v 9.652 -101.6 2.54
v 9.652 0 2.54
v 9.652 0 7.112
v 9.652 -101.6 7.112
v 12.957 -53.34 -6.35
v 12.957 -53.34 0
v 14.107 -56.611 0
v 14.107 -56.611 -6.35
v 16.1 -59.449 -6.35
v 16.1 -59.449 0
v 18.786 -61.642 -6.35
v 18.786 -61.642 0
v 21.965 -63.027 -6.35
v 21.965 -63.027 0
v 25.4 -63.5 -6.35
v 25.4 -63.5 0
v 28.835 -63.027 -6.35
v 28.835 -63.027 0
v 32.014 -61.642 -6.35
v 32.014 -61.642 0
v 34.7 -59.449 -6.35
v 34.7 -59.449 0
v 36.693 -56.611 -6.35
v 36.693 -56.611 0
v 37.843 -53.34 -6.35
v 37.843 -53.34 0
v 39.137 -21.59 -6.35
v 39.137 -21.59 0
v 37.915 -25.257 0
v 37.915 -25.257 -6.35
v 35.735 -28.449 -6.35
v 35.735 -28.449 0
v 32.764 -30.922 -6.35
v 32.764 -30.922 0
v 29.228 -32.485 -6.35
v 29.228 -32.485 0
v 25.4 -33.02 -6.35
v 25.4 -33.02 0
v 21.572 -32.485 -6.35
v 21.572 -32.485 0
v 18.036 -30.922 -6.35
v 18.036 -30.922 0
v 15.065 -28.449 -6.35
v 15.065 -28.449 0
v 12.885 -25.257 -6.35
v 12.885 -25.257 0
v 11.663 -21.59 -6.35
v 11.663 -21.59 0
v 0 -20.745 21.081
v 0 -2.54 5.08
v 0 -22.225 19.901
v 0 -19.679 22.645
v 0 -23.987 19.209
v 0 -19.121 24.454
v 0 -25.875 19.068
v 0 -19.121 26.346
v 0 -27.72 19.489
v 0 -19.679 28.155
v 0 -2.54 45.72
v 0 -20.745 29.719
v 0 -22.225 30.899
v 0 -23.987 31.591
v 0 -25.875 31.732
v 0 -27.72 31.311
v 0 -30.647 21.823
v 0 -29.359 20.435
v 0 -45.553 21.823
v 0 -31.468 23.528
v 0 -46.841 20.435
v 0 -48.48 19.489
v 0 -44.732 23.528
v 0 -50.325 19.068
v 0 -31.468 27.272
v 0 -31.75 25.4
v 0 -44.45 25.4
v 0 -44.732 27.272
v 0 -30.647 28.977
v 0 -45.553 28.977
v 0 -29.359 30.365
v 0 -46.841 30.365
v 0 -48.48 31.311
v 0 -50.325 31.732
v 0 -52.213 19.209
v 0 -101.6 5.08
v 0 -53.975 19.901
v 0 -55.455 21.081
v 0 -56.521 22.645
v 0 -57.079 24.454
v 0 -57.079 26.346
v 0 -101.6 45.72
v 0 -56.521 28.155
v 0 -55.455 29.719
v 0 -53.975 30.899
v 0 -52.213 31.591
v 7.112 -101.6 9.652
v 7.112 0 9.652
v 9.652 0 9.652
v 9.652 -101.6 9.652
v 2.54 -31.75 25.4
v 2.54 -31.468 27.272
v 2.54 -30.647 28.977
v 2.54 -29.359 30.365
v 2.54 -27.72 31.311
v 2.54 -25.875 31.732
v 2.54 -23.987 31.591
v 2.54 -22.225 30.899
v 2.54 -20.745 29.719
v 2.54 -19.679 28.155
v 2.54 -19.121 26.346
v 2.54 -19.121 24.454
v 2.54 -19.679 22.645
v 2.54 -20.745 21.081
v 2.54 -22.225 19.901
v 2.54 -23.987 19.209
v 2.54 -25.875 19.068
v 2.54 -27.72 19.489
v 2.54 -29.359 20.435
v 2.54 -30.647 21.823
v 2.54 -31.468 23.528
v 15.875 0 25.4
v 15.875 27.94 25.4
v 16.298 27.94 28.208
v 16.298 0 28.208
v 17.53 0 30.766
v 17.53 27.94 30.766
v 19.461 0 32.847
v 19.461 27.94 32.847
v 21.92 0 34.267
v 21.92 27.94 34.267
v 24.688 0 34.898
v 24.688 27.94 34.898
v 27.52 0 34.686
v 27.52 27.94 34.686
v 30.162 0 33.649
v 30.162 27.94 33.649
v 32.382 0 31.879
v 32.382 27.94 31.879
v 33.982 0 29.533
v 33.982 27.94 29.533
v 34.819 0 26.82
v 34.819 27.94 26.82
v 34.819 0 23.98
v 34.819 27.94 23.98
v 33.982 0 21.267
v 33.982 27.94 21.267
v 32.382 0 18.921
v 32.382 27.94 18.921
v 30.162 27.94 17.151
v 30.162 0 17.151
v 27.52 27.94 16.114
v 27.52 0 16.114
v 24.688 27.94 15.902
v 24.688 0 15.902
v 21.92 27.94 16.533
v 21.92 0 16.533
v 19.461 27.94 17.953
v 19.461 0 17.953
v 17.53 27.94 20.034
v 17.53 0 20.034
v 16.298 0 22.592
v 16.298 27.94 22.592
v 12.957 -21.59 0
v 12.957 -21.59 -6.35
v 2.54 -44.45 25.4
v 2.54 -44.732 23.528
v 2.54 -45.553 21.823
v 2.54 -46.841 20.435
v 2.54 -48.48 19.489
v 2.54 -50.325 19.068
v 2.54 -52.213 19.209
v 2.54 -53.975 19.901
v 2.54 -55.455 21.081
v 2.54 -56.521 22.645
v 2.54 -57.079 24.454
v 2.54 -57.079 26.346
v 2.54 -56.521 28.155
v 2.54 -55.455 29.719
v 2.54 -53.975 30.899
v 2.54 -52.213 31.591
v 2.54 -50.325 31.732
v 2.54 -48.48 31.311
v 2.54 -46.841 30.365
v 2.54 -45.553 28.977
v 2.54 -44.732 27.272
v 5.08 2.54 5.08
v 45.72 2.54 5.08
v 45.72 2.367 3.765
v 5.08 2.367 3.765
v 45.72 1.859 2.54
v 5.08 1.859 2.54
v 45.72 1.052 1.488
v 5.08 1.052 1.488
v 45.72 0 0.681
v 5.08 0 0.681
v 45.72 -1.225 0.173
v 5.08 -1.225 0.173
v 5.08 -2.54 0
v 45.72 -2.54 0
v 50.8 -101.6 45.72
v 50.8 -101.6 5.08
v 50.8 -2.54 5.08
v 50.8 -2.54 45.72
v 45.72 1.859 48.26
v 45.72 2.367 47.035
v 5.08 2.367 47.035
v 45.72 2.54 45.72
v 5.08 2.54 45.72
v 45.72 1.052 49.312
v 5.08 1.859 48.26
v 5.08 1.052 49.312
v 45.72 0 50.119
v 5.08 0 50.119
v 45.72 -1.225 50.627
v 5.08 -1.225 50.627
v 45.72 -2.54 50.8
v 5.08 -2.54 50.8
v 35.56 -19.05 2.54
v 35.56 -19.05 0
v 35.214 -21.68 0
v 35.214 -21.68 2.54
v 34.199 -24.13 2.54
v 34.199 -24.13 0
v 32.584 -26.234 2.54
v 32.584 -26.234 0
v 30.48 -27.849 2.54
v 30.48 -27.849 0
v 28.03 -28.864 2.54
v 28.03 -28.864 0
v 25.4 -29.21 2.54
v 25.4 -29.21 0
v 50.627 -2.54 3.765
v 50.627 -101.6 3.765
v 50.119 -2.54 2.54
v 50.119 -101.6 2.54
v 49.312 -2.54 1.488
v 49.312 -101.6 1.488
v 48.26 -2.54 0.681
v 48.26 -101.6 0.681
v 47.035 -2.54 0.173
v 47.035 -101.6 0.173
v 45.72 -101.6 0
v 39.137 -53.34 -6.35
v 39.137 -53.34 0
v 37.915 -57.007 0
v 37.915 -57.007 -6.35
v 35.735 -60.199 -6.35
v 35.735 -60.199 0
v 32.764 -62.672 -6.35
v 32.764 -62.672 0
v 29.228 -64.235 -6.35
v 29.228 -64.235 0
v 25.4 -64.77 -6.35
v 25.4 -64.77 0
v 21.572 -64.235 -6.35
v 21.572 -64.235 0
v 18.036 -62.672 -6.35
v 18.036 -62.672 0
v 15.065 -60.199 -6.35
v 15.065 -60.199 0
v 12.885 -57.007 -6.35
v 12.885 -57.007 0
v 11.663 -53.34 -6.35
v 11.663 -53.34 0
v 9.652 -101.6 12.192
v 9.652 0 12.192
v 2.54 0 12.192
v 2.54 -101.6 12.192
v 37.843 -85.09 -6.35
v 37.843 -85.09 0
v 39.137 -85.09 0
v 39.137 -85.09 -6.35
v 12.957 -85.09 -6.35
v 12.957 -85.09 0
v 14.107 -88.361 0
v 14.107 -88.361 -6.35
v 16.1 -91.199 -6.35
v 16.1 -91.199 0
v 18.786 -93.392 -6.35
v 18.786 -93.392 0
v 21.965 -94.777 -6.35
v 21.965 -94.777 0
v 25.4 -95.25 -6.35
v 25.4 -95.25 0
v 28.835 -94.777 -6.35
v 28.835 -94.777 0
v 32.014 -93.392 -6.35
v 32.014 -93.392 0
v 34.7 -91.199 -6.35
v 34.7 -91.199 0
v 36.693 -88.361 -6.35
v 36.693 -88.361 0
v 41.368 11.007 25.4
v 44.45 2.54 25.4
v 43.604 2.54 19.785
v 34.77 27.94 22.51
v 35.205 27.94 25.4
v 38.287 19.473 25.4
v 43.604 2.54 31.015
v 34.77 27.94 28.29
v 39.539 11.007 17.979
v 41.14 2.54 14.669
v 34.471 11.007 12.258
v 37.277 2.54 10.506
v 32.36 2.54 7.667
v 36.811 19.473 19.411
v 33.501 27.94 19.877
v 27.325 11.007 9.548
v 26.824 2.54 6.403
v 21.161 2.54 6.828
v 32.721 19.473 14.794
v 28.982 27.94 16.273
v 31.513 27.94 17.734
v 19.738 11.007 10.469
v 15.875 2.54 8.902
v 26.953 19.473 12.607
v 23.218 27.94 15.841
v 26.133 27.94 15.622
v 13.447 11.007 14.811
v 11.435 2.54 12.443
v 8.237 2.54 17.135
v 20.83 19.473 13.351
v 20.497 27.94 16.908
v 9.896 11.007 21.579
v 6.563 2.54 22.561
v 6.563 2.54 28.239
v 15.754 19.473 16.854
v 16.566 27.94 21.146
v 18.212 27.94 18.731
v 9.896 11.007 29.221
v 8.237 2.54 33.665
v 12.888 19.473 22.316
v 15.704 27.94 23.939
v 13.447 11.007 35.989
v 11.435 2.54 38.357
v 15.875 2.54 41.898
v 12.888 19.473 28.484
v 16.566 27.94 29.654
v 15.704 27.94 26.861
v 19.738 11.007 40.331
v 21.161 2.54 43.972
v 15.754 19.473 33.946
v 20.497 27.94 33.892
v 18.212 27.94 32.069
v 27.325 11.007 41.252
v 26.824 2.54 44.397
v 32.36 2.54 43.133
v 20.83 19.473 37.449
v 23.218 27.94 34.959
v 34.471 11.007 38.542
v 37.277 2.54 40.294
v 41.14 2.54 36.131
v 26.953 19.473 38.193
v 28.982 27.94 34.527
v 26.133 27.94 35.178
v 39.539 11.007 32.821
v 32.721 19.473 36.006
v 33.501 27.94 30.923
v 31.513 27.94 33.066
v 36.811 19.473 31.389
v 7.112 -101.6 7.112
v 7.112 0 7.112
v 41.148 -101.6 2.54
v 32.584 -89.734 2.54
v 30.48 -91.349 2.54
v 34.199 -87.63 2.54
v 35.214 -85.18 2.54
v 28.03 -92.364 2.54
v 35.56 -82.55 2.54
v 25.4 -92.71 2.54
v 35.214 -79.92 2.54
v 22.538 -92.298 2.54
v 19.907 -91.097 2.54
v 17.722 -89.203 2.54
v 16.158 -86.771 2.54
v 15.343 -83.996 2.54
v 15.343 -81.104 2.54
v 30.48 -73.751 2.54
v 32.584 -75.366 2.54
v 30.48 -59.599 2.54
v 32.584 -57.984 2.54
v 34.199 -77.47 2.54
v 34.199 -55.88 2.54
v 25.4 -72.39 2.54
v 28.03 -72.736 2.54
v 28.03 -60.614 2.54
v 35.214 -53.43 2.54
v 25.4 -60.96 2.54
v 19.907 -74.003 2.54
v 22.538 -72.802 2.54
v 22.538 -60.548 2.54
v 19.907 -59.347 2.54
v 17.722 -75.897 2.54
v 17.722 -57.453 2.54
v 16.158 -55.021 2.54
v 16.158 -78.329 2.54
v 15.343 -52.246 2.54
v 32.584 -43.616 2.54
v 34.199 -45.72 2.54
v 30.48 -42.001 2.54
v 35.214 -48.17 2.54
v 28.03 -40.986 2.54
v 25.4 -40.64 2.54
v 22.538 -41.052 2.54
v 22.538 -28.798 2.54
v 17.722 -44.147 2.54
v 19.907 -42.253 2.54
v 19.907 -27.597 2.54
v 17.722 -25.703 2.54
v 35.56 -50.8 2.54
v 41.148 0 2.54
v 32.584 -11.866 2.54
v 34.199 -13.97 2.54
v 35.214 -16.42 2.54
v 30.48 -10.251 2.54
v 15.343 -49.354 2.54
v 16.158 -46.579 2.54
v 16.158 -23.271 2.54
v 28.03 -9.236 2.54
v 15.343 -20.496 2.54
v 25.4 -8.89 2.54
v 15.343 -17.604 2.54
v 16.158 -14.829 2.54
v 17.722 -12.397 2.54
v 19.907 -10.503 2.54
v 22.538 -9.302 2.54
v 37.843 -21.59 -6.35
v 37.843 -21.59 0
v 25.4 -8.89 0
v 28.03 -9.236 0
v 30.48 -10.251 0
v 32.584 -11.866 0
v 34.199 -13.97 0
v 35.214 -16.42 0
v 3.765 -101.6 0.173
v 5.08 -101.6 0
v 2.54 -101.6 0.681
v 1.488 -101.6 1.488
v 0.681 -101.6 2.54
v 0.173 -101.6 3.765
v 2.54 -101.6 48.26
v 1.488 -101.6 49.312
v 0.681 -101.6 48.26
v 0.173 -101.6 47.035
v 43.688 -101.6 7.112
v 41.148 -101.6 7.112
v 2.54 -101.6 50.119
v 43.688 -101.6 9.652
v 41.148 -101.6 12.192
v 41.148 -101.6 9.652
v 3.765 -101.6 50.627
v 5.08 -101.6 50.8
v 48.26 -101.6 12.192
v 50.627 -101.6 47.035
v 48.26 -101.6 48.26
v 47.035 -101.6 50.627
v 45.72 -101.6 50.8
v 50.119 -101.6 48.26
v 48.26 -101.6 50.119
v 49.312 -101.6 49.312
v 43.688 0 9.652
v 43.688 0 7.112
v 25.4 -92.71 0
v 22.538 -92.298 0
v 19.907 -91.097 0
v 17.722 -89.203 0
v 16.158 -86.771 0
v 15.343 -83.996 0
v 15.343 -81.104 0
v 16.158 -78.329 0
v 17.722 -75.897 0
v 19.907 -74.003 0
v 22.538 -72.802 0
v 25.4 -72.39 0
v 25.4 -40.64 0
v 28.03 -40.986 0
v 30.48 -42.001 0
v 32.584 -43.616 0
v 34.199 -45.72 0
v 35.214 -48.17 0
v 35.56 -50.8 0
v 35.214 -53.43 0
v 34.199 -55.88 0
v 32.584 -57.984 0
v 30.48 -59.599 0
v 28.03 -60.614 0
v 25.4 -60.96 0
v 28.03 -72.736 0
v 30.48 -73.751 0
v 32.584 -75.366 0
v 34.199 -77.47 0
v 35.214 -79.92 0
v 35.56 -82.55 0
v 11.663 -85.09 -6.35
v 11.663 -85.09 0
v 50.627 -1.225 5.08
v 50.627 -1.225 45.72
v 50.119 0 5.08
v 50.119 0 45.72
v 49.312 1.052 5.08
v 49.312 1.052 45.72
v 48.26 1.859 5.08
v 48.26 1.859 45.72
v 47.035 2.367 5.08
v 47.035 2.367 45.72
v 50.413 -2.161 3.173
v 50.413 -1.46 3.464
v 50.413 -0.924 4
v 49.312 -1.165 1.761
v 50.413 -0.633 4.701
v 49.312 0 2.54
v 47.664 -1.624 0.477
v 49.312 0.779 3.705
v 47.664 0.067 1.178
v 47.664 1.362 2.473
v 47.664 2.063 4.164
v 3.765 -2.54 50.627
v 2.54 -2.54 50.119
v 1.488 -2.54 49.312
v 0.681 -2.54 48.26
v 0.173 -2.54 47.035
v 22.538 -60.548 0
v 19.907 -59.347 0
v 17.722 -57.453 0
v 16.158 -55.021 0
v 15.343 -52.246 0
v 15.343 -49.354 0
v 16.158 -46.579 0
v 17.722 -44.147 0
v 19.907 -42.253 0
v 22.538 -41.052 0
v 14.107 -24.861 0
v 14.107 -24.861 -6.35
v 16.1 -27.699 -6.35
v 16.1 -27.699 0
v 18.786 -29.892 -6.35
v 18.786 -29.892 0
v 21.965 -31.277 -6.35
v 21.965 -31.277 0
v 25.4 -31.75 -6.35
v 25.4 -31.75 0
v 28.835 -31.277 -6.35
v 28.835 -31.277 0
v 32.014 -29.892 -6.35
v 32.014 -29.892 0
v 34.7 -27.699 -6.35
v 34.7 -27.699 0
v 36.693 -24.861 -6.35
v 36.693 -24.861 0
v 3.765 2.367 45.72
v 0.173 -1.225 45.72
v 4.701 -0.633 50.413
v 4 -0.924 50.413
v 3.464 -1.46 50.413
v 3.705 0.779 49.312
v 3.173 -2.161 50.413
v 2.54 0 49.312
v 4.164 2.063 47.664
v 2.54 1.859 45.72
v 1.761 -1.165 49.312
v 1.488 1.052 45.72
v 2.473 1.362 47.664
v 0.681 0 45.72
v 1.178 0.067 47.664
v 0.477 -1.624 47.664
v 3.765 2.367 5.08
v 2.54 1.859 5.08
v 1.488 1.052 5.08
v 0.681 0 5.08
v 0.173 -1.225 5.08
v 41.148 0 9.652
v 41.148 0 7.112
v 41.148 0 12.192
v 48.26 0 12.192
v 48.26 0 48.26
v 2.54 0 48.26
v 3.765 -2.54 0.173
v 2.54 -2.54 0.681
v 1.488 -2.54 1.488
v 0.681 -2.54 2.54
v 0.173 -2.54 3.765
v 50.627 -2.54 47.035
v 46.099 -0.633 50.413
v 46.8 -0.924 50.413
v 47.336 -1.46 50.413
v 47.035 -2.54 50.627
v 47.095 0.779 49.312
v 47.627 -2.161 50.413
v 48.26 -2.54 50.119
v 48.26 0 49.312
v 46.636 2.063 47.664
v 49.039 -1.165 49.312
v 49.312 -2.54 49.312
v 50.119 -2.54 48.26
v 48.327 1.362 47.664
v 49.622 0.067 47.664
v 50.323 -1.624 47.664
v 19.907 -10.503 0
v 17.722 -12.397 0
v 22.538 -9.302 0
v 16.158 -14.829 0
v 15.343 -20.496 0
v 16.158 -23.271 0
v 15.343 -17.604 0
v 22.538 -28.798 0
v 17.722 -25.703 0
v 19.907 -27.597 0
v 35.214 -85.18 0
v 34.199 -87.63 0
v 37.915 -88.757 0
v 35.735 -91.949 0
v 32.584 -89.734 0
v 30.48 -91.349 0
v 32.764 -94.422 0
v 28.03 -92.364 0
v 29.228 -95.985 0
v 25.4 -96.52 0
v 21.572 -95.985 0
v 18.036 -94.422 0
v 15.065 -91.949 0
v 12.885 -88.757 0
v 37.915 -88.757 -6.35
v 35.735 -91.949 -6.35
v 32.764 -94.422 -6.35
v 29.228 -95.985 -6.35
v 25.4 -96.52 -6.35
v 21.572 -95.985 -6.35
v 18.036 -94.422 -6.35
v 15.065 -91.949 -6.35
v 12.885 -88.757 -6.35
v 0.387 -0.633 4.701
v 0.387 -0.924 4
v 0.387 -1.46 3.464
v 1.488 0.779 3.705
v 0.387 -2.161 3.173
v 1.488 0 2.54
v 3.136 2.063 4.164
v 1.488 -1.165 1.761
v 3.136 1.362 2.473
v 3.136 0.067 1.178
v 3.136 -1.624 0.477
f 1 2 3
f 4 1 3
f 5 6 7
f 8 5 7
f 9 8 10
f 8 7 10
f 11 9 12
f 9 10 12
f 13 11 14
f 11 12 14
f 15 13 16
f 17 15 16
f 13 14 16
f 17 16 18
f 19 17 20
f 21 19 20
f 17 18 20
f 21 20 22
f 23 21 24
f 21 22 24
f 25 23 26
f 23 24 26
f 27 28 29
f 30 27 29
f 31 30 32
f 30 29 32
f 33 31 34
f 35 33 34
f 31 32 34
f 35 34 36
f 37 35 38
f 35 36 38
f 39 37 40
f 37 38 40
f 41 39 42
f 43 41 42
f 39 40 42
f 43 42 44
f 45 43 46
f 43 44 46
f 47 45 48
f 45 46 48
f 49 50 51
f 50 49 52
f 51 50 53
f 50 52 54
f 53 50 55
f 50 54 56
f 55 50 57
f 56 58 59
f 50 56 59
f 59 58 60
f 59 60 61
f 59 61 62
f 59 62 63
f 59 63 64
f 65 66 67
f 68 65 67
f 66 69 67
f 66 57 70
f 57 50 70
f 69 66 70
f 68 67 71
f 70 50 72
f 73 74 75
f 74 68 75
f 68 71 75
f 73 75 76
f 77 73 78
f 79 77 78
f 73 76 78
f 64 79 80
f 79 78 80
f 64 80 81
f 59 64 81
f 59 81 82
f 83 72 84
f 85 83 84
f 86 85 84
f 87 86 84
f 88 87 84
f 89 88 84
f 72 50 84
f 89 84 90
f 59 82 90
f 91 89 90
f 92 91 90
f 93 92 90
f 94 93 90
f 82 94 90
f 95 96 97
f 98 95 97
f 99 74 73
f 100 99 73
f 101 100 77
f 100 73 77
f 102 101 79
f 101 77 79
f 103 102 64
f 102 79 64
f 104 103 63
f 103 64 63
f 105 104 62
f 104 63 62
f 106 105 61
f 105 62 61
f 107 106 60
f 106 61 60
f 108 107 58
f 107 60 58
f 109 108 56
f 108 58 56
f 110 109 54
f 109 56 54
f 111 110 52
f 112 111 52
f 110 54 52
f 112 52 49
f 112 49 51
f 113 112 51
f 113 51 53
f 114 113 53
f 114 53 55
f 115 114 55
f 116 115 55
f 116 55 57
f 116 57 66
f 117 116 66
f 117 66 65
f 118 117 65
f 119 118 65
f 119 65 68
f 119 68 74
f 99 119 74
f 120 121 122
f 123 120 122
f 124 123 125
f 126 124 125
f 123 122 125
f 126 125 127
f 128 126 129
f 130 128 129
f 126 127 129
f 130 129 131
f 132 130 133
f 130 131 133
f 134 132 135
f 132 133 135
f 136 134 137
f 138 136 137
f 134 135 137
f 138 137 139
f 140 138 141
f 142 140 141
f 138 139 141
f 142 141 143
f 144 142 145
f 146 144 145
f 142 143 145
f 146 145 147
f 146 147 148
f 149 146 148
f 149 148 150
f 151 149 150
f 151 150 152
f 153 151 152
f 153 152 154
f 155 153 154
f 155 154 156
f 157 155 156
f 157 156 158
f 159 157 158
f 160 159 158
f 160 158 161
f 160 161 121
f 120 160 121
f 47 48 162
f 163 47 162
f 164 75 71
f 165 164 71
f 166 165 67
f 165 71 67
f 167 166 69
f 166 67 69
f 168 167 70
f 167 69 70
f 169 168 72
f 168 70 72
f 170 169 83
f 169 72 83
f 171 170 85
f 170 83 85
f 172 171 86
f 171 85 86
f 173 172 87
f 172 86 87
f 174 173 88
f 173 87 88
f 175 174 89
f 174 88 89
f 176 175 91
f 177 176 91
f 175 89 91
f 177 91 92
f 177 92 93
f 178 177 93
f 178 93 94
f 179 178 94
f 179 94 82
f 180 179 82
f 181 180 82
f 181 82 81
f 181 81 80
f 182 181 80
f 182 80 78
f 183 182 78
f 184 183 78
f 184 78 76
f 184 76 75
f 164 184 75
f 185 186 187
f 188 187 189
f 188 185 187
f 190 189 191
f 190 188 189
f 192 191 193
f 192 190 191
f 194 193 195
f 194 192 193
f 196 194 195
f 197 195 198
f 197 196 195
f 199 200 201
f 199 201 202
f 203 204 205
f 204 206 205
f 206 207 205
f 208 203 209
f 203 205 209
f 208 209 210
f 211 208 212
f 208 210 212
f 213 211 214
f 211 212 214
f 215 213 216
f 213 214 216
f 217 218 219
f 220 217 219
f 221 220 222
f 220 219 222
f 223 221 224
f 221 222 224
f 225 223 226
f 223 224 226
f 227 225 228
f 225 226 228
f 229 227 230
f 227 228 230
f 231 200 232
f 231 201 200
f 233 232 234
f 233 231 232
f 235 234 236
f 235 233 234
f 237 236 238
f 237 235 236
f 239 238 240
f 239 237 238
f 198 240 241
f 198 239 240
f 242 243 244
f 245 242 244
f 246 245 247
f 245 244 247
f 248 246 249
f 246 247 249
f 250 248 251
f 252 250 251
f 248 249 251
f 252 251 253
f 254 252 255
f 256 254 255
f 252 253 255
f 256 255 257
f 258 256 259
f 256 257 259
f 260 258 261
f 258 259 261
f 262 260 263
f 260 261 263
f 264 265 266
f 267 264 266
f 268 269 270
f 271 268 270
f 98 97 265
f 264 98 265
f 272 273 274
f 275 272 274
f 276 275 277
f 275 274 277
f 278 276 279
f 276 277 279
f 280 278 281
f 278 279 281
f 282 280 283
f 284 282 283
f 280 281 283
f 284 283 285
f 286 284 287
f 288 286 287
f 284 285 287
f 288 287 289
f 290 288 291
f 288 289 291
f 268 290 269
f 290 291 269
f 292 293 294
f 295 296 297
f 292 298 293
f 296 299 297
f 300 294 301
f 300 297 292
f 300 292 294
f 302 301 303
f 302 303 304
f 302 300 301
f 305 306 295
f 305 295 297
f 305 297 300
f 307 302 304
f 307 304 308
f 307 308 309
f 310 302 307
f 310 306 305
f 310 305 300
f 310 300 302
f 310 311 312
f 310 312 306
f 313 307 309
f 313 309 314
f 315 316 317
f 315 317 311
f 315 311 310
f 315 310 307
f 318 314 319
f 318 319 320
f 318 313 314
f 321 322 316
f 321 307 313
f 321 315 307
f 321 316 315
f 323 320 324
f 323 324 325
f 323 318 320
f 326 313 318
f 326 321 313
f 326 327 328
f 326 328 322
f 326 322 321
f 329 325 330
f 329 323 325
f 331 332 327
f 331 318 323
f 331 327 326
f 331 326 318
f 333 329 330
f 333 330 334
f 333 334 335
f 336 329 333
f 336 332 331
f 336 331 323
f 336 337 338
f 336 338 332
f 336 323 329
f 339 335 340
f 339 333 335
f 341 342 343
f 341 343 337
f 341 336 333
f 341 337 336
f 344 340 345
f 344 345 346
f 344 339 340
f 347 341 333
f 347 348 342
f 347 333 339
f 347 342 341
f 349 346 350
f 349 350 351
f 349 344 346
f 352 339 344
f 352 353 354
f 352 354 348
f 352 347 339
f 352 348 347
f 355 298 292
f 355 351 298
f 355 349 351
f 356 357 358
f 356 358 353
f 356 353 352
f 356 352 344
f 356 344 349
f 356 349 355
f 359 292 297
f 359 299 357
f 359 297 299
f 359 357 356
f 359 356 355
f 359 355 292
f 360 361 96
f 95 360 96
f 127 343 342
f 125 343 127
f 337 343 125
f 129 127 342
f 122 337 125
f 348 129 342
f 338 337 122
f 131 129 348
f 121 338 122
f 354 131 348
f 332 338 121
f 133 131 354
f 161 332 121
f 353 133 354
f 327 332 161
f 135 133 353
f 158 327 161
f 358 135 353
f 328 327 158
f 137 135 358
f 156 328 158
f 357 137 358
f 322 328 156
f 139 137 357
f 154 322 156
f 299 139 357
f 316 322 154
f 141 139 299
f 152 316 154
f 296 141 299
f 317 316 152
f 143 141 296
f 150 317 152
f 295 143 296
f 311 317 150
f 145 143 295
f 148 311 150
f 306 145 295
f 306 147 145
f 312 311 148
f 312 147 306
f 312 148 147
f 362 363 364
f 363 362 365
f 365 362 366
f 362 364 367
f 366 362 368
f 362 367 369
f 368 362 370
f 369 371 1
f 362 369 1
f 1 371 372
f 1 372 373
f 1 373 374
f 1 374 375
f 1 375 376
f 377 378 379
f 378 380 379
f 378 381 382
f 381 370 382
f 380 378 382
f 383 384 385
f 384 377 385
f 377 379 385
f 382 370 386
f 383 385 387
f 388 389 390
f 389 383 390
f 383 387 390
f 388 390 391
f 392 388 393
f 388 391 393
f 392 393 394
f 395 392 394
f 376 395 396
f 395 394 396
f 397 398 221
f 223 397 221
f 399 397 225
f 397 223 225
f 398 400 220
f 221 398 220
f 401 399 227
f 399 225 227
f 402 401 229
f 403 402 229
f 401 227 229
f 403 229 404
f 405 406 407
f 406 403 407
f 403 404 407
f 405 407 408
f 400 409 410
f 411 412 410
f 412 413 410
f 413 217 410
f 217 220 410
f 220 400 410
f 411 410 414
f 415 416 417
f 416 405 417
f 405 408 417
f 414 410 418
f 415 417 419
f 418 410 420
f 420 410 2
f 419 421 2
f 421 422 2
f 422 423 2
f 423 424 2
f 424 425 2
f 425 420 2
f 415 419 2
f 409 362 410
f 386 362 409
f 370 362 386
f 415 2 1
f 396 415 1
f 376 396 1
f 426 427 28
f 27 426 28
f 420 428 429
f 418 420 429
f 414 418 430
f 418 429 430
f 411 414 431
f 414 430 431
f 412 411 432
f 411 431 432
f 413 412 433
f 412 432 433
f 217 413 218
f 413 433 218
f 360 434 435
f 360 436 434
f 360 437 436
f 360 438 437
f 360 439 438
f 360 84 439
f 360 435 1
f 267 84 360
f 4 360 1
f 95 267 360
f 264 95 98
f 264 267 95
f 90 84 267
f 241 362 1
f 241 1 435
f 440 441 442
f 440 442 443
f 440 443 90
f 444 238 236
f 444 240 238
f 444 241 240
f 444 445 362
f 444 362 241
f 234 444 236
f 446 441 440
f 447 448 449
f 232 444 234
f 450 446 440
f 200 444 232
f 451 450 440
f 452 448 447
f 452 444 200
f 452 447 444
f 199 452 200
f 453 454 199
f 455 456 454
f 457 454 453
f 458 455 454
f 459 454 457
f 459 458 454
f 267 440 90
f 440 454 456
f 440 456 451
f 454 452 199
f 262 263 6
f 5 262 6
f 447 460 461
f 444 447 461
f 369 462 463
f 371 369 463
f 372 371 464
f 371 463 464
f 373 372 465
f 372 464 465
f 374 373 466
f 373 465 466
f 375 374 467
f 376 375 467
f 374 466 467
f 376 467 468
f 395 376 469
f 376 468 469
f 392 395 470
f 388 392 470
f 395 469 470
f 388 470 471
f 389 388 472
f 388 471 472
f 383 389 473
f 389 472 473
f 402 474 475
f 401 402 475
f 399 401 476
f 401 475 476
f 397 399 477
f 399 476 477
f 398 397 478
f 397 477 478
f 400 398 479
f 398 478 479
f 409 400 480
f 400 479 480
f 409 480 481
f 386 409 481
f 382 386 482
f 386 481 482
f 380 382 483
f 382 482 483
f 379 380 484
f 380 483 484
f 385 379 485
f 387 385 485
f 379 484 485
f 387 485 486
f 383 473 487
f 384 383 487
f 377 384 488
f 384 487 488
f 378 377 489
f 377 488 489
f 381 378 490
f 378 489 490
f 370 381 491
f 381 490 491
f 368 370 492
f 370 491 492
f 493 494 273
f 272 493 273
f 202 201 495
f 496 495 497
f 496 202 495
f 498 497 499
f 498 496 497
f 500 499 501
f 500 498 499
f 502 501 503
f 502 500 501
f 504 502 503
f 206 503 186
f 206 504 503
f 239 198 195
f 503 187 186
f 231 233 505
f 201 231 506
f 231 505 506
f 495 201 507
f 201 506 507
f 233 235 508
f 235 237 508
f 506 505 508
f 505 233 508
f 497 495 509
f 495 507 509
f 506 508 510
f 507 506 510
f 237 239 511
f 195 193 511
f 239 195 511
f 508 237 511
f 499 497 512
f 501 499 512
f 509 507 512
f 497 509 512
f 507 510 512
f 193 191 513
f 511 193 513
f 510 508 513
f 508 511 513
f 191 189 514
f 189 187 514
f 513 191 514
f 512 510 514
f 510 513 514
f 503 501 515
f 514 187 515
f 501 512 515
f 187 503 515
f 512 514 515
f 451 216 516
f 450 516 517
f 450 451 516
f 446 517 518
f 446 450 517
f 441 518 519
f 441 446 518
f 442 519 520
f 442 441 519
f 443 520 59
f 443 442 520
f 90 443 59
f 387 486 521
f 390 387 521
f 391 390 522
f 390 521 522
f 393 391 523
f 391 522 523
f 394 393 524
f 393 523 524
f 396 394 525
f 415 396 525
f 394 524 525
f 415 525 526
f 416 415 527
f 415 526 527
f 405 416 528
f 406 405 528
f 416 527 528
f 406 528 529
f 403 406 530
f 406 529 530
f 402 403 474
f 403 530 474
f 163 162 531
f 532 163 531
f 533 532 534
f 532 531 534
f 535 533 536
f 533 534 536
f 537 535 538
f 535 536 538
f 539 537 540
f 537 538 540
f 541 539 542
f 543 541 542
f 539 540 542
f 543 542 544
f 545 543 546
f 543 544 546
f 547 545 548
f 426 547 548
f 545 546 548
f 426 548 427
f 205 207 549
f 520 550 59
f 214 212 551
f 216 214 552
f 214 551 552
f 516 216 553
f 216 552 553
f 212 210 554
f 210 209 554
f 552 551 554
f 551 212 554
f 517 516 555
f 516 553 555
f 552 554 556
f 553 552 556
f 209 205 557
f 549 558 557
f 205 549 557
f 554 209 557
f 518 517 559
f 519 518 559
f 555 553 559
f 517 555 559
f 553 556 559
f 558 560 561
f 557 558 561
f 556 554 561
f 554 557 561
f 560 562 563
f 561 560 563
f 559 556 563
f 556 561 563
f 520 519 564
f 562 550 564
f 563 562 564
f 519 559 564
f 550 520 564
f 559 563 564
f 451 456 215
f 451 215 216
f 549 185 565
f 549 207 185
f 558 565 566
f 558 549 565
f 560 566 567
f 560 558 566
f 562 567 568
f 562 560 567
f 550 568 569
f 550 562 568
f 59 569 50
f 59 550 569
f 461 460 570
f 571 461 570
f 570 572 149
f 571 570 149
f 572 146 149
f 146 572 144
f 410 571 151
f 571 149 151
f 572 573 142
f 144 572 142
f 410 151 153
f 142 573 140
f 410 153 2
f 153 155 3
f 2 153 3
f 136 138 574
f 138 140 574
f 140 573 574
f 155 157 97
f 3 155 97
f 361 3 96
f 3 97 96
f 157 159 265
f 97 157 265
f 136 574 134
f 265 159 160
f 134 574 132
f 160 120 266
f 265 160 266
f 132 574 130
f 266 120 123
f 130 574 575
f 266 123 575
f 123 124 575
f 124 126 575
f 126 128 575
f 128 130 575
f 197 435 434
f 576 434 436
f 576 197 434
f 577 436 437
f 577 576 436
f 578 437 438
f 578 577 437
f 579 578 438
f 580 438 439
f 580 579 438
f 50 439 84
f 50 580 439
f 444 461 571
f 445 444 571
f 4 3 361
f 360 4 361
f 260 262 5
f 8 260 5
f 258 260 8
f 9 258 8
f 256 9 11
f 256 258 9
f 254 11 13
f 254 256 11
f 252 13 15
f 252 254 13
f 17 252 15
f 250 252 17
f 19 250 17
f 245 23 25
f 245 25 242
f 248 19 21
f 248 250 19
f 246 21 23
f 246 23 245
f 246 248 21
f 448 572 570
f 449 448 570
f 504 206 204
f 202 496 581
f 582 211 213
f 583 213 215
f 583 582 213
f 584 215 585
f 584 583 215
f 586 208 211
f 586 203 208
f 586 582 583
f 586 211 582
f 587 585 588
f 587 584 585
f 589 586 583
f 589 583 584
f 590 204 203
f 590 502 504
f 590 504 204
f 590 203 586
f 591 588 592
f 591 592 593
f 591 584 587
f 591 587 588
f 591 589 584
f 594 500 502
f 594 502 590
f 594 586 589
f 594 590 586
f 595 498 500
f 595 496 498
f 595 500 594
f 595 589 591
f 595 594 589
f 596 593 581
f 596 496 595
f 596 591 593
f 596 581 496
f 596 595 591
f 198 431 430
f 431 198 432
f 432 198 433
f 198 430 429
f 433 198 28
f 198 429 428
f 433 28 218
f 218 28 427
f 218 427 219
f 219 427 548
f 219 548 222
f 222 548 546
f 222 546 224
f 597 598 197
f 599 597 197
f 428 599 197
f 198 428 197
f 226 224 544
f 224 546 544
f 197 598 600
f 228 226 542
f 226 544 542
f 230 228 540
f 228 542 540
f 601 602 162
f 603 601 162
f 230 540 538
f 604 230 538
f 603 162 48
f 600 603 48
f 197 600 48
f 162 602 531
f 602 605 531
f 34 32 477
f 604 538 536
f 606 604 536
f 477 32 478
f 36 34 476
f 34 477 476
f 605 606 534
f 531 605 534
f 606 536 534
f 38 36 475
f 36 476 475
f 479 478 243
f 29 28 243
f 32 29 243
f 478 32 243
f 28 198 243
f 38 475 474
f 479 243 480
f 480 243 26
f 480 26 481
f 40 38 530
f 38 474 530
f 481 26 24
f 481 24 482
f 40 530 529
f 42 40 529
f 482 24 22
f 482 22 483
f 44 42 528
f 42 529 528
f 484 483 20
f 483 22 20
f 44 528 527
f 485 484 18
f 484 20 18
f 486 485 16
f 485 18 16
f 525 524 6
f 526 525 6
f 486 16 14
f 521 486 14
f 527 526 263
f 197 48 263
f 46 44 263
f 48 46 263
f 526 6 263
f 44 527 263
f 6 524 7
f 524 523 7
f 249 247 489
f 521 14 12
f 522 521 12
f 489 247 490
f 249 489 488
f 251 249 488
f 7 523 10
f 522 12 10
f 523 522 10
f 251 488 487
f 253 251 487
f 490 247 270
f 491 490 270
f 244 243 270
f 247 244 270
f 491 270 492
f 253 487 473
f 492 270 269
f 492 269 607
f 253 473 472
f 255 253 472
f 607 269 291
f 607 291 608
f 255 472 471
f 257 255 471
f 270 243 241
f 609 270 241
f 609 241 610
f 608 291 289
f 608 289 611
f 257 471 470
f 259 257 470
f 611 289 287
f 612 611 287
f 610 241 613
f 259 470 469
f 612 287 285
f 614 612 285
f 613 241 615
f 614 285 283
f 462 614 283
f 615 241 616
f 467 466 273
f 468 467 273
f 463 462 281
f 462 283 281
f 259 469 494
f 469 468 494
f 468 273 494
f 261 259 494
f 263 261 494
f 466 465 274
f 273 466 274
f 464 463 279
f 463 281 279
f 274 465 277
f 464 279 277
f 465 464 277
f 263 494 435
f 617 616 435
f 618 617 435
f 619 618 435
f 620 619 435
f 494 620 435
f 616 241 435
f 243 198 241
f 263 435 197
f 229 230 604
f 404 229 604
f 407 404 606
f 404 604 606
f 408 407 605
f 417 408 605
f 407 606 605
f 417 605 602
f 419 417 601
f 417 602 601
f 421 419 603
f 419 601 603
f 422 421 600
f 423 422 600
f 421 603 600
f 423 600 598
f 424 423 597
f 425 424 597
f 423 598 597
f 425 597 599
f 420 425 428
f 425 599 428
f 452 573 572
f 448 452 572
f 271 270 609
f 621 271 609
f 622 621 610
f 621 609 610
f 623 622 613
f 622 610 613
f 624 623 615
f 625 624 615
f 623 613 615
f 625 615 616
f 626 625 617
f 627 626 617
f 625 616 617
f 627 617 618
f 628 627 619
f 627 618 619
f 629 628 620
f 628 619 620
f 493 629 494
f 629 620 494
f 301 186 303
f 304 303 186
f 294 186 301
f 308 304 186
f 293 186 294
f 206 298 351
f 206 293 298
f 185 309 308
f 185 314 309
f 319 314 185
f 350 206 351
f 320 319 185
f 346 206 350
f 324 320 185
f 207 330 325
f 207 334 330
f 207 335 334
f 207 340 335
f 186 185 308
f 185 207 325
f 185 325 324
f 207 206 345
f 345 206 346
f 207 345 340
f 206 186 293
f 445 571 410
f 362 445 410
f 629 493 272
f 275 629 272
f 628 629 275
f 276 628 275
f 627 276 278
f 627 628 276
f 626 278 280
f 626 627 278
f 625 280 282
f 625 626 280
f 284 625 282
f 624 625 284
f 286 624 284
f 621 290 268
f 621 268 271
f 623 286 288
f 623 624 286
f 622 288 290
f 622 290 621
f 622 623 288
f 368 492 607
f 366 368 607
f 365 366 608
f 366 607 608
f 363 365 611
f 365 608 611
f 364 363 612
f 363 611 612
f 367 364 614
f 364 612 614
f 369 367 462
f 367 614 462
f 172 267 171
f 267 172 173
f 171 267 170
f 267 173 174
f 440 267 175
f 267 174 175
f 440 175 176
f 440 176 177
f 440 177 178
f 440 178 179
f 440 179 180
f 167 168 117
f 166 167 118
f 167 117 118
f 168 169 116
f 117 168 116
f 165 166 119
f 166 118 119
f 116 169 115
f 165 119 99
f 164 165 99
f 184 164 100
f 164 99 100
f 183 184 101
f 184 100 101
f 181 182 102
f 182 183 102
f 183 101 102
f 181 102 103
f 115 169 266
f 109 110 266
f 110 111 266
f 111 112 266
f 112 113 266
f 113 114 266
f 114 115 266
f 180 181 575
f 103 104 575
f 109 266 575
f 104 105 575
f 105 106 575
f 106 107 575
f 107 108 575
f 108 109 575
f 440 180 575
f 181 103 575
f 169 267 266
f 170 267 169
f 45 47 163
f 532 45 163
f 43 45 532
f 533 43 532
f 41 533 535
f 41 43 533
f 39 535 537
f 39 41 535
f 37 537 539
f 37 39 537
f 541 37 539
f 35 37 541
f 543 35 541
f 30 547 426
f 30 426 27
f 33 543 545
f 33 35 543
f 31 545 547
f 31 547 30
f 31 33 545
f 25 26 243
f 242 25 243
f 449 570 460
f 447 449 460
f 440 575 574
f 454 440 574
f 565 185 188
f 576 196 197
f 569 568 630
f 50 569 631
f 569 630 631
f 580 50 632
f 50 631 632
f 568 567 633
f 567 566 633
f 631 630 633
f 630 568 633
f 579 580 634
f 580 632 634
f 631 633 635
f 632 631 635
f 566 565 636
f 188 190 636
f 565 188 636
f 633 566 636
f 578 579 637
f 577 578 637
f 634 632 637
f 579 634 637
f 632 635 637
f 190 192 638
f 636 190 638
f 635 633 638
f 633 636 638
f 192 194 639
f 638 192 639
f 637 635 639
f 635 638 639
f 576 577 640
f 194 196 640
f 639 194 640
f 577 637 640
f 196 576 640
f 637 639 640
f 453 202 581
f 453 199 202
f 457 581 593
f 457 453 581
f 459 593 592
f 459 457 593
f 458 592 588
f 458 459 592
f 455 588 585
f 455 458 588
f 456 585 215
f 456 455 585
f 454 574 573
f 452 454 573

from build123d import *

# Parameters (mm, degrees)
F0_W      = 50.8
F0_H      = 50.8
F1_DEPTH  = 101.6
F3_DEPTH  = 7.62
F5_DEPTH  = 7.62
F7_DEPTH  = 6.35
F8_W      = 50.8
F8_H      = 50.8
F9_DEPTH  = 2.54
F11_DEPTH = 25.4
F11_TAPER = 20
F12_R     = 9.525
F13_DEPTH = 129.541
F14_R     = 5.08


with BuildPart() as f1:
    # F0 (on Front) → F1 (new body)
    with BuildSketch(Plane.XZ):
        with Locations((25.4, 25.4)):
            Rectangle(F0_W, F0_H)
        Polygon((2.54, 12.192), (2.54, 48.26), (48.26, 48.26), (48.26, 12.192), (41.148, 12.192), (41.148, 9.652), (43.688, 9.652), (43.688, 7.112), (41.148, 7.112), (41.148, 2.54), (9.652, 2.54), (9.652, 7.112), (7.112, 7.112), (7.112, 9.652), (9.652, 9.652), (9.652, 12.192), align=None, mode=Mode.SUBTRACT)
    extrude(amount=F1_DEPTH)

    # F2 (on face) → F3 (cut)
    with BuildSketch(Plane(origin=(0, 0, 0), x_dir=(1, 0, 0), z_dir=(0, 0, -1))):
        with BuildLine():
            ThreePointArc((25.4, 8.89), (32.5842048969, 11.8657951031), (35.56, 19.05))
            ThreePointArc((35.56, 19.05), (32.5842048969, 26.2342048969), (25.4, 29.21))
            Line((25.4, 29.21), (25.4, 8.89))
        make_face()
        with BuildLine():
            Line((25.4, 8.89), (25.4, 29.21))
            ThreePointArc((25.4, 29.21), (15.24, 19.05), (25.4, 8.89))
        make_face()
        with BuildLine():
            Line((25.4, 60.96), (25.4, 40.64))
            ThreePointArc((25.4, 40.64), (32.5842048969, 43.6157951031), (35.56, 50.8))
            ThreePointArc((35.56, 50.8), (32.5842048969, 57.9842048969), (25.4, 60.96))
        make_face()
        with BuildLine():
            ThreePointArc((25.4, 60.96), (15.24, 50.8), (25.4, 40.64))
            Line((25.4, 40.64), (25.4, 60.96))
        make_face()
        with BuildLine():
            Line((25.4, 92.71), (25.4, 72.39))
            ThreePointArc((25.4, 72.39), (32.5842048969, 75.3657951031), (35.56, 82.55))
            ThreePointArc((35.56, 82.55), (32.5842048969, 89.7342048969), (25.4, 92.71))
        make_face()
        with BuildLine():
            ThreePointArc((25.4, 92.71), (15.24, 82.55), (25.4, 72.39))
            Line((25.4, 72.39), (25.4, 92.71))
        make_face()
    extrude(amount=-F3_DEPTH, mode=Mode.SUBTRACT)

    # F4 (on face) → F5 (cut)
    with BuildSketch(Plane(origin=(0, 0, 0), x_dir=(0, -1, 0), z_dir=(-1, 0, 0))):
        with BuildLine():
            Line((44.45, 25.4), (57.15, 25.4))
            ThreePointArc((57.15, 25.4), (50.8, 31.75), (44.45, 25.4))
        make_face()
        with BuildLine():
            ThreePointArc((19.05, 25.4), (25.4, 19.05), (31.75, 25.4))
            Line((31.75, 25.4), (19.05, 25.4))
        make_face()
        with BuildLine():
            Line((19.05, 25.4), (31.75, 25.4))
            ThreePointArc((31.75, 25.4), (25.4, 31.75), (19.05, 25.4))
        make_face()
        with BuildLine():
            ThreePointArc((44.45, 25.4), (50.8, 19.05), (57.15, 25.4))
            Line((57.15, 25.4), (44.45, 25.4))
        make_face()
    extrude(amount=-F5_DEPTH, mode=Mode.SUBTRACT)

    # F6 (on face) → F7 (join)
    with BuildSketch(Plane(origin=(0, 0, 0), x_dir=(1, 0, 0), z_dir=(0, 0, -1))):
        with BuildLine():
            ThreePointArc((12.9565921067, 85.09), (25.4, 95.25), (37.8434078933, 85.09))
            Line((37.8434078933, 85.09), (39.1371503595, 85.09))
            ThreePointArc((39.1371503595, 85.09), (25.4, 96.52), (11.6628496405, 85.09))
            Line((11.6628496405, 85.09), (12.9565921067, 85.09))
        make_face()
        with BuildLine():
            ThreePointArc((12.9565921067, 53.34), (25.4, 63.5), (37.8434078933, 53.34))
            Line((37.8434078933, 53.34), (39.1371503595, 53.34))
            ThreePointArc((39.1371503595, 53.34), (25.4, 64.77), (11.6628496405, 53.34))
            Line((11.6628496405, 53.34), (12.9565921067, 53.34))
        make_face()
        with BuildLine():
            ThreePointArc((12.9565921067, 21.59), (25.4, 31.75), (37.8434078933, 21.59))
            Line((37.8434078933, 21.59), (39.1371503595, 21.59))
            ThreePointArc((39.1371503595, 21.59), (25.4, 33.02), (11.6628496405, 21.59))
            Line((11.6628496405, 21.59), (12.9565921067, 21.59))
        make_face()
    extrude(amount=F7_DEPTH)

    # F8 (on face) → F9 (join)
    with BuildSketch(Plane(origin=(0, 0, 0), x_dir=(-1, 0, 0), z_dir=(0, 1, 0))):
        with Locations((-25.4, 25.4)):
            Rectangle(F8_W, F8_H)
    extrude(amount=F9_DEPTH)

    # F10 (on face) → F11 (join)
    with BuildSketch(Plane(origin=(0, 2.54, 0), x_dir=(-1, 0, 0), z_dir=(0, 1, 0))):
        with BuildLine():
            Line((-44.45, 25.4), (-6.35, 25.4))
            ThreePointArc((-6.35, 25.4), (-25.4, 44.45), (-44.45, 25.4))
        make_face()
        with BuildLine():
            ThreePointArc((-44.45, 25.4), (-25.4, 6.35), (-6.35, 25.4))
            Line((-6.35, 25.4), (-44.45, 25.4))
        make_face()
    extrude(amount=F11_DEPTH, taper=F11_TAPER)

    # F12 (on face) → F13 (cut, through all)
    with BuildSketch(Plane(origin=(0, 27.94, 0), x_dir=(-1, 0, 0), z_dir=(0, 1, 0))):
        with Locations((-25.4, 25.4)):
            Circle(F12_R)
    extrude(amount=-F13_DEPTH, mode=Mode.SUBTRACT)

    # F14
    f14_edges = [f1.edges().sort_by_distance(p)[0] for p in [
        (25.4, 2.54, 0),
        (0, 2.54, 25.4),
        (0, -49.53, 0),
        (50.8, -49.53, 0),
        (50.8, 2.54, 25.4),
        (25.4, 2.54, 50.8),
        (50.8, -49.53, 50.8),
        (0, -49.53, 50.8),
    ]]
    fillet(f14_edges, radius=F14_R)


solid = f1.part
